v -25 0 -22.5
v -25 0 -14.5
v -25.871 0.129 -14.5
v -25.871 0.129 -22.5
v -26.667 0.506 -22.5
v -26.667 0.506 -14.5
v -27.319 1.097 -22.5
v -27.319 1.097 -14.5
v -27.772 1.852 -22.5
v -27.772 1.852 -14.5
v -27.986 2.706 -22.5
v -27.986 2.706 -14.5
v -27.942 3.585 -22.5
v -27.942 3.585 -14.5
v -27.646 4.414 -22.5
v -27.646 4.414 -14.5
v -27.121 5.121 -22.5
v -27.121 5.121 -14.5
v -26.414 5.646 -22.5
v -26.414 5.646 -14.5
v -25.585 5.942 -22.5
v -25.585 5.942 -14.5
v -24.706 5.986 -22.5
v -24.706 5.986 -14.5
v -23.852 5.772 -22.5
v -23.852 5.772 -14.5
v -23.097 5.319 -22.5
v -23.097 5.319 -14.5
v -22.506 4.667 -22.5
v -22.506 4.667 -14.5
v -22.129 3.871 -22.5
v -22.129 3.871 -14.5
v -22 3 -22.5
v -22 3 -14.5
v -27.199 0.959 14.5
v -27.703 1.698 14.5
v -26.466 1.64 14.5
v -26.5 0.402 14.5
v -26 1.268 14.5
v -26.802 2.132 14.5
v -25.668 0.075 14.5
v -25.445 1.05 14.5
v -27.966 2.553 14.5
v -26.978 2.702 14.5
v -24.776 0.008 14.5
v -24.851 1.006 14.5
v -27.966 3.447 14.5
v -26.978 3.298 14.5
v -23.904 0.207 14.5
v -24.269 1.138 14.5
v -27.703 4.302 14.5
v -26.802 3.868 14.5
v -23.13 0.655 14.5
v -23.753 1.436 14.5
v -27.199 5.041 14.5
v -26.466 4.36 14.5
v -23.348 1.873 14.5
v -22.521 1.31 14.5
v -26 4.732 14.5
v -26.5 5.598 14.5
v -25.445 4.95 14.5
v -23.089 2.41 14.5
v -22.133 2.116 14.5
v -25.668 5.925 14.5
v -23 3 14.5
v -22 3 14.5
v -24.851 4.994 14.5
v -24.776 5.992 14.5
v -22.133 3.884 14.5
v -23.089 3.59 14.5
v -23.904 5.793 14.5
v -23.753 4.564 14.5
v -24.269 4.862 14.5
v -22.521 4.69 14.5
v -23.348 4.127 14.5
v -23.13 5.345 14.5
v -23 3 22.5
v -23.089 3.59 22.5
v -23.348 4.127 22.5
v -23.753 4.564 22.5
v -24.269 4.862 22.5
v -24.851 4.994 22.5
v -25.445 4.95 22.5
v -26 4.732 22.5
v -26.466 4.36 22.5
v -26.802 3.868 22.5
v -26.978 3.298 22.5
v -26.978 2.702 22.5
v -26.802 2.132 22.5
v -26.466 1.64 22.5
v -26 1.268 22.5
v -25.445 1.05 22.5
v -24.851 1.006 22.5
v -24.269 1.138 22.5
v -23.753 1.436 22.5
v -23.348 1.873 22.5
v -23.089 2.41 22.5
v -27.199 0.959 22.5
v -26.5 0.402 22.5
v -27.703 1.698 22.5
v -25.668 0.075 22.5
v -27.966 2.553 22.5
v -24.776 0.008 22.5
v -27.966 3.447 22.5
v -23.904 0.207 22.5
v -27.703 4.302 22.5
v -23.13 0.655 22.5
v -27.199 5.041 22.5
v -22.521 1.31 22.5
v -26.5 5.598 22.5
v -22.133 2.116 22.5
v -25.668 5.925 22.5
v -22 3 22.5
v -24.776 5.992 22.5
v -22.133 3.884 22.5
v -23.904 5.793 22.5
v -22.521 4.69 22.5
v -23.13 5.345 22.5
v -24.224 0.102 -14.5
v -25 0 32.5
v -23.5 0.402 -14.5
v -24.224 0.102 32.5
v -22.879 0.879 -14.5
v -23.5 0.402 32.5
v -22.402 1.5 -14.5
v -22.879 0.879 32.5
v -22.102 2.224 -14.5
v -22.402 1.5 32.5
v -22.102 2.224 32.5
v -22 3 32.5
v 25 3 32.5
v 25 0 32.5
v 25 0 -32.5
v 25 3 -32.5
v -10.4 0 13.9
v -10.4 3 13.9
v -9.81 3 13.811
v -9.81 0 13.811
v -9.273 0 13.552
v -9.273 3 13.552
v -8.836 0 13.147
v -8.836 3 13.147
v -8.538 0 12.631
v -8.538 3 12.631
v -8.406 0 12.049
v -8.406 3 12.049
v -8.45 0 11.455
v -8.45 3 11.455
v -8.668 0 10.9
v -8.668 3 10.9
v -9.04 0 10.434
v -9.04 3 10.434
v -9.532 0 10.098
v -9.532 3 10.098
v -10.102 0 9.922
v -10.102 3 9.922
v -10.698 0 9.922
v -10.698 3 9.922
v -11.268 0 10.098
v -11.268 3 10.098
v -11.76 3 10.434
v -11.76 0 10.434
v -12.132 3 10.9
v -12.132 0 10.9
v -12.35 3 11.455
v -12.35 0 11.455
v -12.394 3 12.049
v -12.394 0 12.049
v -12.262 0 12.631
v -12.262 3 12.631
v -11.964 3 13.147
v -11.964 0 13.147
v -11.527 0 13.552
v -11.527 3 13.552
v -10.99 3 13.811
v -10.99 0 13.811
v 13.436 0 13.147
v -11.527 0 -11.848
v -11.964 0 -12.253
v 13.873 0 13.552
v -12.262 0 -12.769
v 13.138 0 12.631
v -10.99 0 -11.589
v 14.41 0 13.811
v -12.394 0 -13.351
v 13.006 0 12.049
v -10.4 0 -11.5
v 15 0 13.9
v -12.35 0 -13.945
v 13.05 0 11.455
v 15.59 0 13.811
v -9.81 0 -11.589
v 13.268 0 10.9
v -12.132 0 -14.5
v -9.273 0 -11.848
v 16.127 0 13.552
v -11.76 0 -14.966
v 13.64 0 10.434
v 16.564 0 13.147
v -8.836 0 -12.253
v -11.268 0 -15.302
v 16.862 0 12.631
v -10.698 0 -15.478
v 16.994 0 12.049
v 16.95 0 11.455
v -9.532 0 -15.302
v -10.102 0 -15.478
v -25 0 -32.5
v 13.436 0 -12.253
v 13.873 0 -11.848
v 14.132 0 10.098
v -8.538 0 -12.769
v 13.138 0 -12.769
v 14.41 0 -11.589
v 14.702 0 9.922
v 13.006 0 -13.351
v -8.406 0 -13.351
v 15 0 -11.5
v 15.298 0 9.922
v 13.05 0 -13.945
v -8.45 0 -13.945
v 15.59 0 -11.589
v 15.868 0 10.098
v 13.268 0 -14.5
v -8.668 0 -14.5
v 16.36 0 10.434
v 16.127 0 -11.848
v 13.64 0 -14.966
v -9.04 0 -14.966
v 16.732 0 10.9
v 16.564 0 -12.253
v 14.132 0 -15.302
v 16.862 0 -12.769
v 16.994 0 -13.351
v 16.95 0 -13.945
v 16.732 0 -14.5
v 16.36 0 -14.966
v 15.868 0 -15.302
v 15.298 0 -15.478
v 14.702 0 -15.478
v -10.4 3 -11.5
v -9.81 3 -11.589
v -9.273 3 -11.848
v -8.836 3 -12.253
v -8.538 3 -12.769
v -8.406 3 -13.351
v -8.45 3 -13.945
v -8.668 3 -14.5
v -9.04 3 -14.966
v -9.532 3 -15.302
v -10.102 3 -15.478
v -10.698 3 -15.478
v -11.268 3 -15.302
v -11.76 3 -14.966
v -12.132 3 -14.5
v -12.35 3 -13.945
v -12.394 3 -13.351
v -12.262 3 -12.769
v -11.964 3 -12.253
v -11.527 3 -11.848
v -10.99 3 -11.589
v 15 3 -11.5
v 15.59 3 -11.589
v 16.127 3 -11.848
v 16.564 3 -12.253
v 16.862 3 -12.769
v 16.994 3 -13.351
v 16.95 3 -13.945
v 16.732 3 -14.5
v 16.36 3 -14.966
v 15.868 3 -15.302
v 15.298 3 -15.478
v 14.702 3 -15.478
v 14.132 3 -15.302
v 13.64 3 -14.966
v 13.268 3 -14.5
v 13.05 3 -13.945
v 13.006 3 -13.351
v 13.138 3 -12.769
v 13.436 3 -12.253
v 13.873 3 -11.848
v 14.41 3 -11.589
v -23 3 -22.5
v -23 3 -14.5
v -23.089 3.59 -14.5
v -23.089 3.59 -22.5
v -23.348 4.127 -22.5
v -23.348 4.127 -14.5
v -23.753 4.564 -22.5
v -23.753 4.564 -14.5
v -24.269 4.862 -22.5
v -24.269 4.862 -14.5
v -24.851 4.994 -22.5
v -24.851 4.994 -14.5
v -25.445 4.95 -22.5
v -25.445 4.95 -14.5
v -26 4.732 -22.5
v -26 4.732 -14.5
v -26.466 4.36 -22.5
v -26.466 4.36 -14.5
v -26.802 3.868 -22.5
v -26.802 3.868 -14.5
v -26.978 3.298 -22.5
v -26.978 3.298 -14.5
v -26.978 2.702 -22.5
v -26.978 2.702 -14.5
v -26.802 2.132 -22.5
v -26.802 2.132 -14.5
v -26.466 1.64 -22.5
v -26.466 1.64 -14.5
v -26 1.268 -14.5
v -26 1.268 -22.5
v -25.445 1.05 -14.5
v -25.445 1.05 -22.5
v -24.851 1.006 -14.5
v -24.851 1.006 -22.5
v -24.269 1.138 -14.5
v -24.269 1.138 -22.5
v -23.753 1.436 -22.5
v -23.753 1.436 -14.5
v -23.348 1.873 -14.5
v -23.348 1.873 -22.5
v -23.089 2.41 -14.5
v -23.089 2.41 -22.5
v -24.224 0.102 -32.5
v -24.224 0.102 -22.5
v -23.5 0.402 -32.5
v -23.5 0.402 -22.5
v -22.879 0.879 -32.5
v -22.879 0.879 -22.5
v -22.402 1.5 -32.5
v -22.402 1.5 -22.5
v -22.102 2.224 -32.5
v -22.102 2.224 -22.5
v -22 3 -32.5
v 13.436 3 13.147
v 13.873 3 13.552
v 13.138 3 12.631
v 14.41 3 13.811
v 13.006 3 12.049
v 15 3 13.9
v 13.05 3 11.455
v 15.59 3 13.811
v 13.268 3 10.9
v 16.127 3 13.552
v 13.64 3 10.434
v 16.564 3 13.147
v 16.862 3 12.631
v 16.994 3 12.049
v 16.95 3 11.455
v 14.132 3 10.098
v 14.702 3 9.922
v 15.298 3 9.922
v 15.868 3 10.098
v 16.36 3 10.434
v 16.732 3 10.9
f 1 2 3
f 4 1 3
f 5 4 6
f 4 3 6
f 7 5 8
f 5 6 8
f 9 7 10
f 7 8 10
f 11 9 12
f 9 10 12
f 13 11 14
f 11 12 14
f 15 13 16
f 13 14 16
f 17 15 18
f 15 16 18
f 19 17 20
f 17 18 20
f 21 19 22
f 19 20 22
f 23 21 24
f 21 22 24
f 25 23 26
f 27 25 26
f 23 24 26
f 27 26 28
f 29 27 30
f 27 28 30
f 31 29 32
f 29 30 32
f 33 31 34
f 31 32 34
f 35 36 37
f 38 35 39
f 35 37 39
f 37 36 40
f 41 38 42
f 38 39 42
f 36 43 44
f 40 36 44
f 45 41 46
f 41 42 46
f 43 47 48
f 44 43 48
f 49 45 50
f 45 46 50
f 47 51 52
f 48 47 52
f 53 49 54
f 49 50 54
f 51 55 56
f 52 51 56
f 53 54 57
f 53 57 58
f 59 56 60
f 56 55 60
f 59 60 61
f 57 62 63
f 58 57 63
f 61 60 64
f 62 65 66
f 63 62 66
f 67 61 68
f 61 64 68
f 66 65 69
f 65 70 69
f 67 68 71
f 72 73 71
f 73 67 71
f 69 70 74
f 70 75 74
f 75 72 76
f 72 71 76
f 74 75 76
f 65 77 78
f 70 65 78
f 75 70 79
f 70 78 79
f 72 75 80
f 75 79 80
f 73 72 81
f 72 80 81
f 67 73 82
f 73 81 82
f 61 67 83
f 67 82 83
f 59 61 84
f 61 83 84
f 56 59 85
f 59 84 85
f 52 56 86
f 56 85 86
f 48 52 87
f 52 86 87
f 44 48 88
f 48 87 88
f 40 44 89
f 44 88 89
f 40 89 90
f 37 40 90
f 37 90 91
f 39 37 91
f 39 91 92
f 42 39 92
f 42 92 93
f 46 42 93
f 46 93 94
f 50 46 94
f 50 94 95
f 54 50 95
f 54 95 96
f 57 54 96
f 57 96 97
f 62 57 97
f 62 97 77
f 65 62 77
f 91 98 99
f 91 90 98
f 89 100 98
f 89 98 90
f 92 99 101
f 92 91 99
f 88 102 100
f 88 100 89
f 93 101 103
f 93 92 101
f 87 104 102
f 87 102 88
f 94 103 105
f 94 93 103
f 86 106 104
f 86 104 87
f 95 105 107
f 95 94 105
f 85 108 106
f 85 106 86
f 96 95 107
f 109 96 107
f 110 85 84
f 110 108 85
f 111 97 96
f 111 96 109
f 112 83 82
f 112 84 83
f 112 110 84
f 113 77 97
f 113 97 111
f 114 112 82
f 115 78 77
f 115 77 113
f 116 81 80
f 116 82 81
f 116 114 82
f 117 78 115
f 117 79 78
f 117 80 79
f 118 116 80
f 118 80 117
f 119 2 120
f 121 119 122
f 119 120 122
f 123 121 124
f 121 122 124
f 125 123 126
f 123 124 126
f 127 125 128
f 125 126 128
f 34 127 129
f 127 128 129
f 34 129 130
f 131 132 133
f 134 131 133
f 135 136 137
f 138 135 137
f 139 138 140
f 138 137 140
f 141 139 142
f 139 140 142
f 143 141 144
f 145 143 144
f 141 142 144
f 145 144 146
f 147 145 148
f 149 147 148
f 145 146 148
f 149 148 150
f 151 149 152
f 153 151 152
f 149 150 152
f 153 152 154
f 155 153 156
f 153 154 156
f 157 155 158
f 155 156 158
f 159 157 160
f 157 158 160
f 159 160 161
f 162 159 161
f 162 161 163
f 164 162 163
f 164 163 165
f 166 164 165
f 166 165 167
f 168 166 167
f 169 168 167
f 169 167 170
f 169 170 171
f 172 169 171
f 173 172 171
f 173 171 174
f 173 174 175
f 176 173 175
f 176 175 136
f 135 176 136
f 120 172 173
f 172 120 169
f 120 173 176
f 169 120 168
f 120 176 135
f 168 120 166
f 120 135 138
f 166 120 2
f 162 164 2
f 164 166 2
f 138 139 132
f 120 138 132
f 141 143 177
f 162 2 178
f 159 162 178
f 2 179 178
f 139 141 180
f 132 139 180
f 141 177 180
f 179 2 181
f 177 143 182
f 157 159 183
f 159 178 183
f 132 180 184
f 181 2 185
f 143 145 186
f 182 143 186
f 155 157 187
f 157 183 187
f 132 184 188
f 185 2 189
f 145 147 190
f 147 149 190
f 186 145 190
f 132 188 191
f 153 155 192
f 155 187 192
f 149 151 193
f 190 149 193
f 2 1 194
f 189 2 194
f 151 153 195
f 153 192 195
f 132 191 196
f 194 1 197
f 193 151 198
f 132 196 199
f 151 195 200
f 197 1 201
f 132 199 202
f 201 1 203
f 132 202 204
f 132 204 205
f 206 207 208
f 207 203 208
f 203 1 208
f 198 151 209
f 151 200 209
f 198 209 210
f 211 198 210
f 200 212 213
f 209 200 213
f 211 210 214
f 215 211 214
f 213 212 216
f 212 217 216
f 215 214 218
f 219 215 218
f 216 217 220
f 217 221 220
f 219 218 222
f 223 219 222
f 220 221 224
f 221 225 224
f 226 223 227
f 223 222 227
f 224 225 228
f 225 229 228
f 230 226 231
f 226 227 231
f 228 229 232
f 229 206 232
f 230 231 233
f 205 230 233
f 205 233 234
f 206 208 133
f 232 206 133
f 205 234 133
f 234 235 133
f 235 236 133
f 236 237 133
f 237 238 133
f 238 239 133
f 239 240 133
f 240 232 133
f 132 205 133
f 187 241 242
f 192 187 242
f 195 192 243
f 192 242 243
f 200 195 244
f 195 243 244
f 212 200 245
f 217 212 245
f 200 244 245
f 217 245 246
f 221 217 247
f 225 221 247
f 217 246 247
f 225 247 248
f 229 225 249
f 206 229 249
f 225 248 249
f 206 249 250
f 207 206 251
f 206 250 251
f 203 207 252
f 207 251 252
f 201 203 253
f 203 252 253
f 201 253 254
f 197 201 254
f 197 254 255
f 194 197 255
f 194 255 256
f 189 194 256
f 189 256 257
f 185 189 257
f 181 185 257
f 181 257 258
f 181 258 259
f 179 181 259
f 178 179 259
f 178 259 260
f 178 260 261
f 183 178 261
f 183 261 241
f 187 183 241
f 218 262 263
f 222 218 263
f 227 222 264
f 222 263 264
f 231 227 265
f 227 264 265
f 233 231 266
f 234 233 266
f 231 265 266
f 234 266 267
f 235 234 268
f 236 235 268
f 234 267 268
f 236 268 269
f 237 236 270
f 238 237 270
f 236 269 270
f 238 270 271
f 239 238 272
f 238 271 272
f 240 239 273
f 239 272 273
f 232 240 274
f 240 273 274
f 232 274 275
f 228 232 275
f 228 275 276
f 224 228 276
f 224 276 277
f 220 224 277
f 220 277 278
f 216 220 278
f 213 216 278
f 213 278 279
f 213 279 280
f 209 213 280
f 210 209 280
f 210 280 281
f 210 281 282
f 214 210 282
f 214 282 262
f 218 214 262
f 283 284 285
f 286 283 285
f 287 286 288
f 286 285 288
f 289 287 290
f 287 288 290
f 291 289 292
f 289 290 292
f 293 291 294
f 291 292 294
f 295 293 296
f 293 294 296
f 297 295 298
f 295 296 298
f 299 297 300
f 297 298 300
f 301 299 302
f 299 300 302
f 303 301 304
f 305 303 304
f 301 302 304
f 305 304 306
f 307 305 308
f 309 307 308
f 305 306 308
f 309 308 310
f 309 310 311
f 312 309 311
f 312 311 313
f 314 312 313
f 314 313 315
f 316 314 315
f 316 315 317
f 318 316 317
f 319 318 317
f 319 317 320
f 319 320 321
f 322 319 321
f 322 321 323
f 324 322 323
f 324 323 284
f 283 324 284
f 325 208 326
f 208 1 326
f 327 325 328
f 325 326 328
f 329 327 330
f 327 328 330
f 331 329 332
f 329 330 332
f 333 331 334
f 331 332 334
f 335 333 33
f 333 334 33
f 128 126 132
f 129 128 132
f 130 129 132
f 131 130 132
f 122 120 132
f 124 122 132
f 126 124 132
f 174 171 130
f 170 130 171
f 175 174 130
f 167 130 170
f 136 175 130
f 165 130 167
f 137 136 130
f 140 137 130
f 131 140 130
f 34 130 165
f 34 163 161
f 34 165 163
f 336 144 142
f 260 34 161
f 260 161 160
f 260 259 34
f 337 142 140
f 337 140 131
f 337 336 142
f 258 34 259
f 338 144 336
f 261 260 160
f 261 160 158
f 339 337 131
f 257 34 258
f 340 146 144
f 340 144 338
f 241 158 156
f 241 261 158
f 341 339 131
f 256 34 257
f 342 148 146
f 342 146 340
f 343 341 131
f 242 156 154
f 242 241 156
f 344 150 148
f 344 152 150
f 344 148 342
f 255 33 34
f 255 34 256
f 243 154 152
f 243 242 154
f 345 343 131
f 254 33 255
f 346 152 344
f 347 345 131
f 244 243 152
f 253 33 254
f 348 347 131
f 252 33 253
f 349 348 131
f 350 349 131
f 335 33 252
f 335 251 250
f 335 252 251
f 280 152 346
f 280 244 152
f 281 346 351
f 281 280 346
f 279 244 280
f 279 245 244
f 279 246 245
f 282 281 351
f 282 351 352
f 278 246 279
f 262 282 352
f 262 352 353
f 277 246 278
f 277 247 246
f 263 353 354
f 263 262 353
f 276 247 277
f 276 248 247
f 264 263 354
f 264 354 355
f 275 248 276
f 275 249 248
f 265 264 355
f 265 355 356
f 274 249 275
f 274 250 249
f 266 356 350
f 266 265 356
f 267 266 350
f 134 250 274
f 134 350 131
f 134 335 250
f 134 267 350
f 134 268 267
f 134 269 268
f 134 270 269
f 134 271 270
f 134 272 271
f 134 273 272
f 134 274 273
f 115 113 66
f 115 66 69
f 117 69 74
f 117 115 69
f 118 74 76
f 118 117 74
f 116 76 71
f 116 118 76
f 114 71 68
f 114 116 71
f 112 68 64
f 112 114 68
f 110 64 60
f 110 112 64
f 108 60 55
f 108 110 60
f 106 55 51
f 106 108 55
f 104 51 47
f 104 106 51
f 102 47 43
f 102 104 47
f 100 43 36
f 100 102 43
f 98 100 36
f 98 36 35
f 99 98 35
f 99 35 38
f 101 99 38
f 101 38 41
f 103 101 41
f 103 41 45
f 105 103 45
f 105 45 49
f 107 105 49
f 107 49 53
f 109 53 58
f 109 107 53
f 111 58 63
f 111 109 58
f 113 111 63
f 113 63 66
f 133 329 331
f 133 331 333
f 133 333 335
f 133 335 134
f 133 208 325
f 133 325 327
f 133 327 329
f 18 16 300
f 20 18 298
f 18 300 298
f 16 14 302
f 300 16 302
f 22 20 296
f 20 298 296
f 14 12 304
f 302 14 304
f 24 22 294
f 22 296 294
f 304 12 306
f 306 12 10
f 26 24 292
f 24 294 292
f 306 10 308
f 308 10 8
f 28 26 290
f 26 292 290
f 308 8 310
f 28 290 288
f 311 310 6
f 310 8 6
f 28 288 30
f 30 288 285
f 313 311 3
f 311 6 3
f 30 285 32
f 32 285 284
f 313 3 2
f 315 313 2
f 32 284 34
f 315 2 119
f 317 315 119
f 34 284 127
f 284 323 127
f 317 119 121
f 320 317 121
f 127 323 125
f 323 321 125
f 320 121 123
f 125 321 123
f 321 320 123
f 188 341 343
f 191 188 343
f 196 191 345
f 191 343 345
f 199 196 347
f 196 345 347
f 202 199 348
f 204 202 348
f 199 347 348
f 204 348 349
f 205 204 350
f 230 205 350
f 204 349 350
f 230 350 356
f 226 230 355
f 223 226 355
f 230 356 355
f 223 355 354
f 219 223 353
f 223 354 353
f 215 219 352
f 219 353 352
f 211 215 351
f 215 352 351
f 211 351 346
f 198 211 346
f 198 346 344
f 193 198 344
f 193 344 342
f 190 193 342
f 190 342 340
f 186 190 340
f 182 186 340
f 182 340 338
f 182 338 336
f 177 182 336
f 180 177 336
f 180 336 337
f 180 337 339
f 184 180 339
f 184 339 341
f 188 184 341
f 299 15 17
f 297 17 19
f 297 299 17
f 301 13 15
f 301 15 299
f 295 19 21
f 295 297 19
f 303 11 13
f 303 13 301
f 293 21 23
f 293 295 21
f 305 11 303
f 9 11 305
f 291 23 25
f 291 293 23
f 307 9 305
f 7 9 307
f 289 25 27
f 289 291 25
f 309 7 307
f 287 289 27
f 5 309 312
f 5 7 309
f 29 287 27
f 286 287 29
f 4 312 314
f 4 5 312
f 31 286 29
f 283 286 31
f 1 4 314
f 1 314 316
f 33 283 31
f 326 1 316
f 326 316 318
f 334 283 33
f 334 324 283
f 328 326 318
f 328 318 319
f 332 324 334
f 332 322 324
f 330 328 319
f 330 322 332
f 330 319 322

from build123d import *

# Parameters (mm, degrees)
SKETCH1_W           = 50
SKETCH1_H           = 65
BOSS_EXTRUDE1_DEPTH = 3
SKETCH4_R           = 3
CUT_EXTRUDE1_DEPTH  = 70
SKETCH5_R           = 3
BOSS_EXTRUDE3_DEPTH = 8
BOSS_EXTRUDE4_START = -8
SKETCH6_R           = 3
BOSS_EXTRUDE4_DEPTH = 8
SKETCH7_R           = 2
CUT_EXTRUDE2_DEPTH  = 68
SKETCH8_R           = 2
CUT_EXTRUDE3_DEPTH  = 38


with BuildPart() as part:
    # Sketch1 → Boss-Extrude1 (new body)
    with BuildSketch(Plane(origin=(0, 0, 0), x_dir=(1, 0, 0), z_dir=(0, 1, 0))):
        Rectangle(SKETCH1_W, SKETCH1_H)
    extrude(amount=BOSS_EXTRUDE1_DEPTH)

    # Sketch4 → Cut-Extrude1 (cut)
    with BuildSketch(Plane.XY.offset(32.5)):
        with Locations((-25, 3)):
            Circle(SKETCH4_R)
    extrude(amount=-CUT_EXTRUDE1_DEPTH, mode=Mode.SUBTRACT)

    # Sketch6 → Boss-Extrude4 (add)
    with BuildSketch(Plane(origin=(0, 0, -22.5), x_dir=(-1, 0, 0), z_dir=(0, 0, -1)).offset(BOSS_EXTRUDE4_START)):
        with Locations(Location((25, 3, 0), (0, 0, 180))):
            Circle(SKETCH6_R)
    extrude(amount=BOSS_EXTRUDE4_DEPTH)


with BuildPart() as body_2:
    # Sketch5 → Boss-Extrude3 (new body)
    with BuildSketch(Plane.XY.offset(22.5)):
        with Locations((-25, 3)):
            Circle(SKETCH5_R)
    extrude(amount=-BOSS_EXTRUDE3_DEPTH)


with BuildPart() as cut_extrude2_tool:
    # Sketch7 → Cut-Extrude2 (new body)
    with BuildSketch(Plane.XY.offset(22.5)):
        with Locations((-25, 3)):
            Circle(SKETCH7_R)
    extrude(amount=-CUT_EXTRUDE2_DEPTH)


with BuildPart() as part_1:
    add(part.part)

    # Cut-Extrude2: cut by cut_extrude2_tool
    add(cut_extrude2_tool.part, mode=Mode.SUBTRACT)

    # Sketch8 → Cut-Extrude3 (cut)
    with BuildSketch(Plane(origin=(0, 3, 0), x_dir=(1, 0, 0), z_dir=(0, 1, 0))):
        with Locations(Location((-10.4, 13.5, 0), (0, 0, 270))):
            Circle(SKETCH8_R)
        with Locations(Location((15, 13.5, 0), (0, 0, 270))):
            Circle(SKETCH8_R)
        with Locations(Location((15, -11.9, 0), (0, 0, 270))):
            Circle(SKETCH8_R)
        with Locations(Location((-10.4, -11.9, 0), (0, 0, 270))):
            Circle(SKETCH8_R)
    extrude(amount=-CUT_EXTRUDE3_DEPTH, mode=Mode.SUBTRACT)


with BuildPart() as body_2_1:
    add(body_2.part)

    # Cut-Extrude2: cut by cut_extrude2_tool
    add(cut_extrude2_tool.part, mode=Mode.SUBTRACT)


solid = Compound([part_1.part, body_2_1.part])
